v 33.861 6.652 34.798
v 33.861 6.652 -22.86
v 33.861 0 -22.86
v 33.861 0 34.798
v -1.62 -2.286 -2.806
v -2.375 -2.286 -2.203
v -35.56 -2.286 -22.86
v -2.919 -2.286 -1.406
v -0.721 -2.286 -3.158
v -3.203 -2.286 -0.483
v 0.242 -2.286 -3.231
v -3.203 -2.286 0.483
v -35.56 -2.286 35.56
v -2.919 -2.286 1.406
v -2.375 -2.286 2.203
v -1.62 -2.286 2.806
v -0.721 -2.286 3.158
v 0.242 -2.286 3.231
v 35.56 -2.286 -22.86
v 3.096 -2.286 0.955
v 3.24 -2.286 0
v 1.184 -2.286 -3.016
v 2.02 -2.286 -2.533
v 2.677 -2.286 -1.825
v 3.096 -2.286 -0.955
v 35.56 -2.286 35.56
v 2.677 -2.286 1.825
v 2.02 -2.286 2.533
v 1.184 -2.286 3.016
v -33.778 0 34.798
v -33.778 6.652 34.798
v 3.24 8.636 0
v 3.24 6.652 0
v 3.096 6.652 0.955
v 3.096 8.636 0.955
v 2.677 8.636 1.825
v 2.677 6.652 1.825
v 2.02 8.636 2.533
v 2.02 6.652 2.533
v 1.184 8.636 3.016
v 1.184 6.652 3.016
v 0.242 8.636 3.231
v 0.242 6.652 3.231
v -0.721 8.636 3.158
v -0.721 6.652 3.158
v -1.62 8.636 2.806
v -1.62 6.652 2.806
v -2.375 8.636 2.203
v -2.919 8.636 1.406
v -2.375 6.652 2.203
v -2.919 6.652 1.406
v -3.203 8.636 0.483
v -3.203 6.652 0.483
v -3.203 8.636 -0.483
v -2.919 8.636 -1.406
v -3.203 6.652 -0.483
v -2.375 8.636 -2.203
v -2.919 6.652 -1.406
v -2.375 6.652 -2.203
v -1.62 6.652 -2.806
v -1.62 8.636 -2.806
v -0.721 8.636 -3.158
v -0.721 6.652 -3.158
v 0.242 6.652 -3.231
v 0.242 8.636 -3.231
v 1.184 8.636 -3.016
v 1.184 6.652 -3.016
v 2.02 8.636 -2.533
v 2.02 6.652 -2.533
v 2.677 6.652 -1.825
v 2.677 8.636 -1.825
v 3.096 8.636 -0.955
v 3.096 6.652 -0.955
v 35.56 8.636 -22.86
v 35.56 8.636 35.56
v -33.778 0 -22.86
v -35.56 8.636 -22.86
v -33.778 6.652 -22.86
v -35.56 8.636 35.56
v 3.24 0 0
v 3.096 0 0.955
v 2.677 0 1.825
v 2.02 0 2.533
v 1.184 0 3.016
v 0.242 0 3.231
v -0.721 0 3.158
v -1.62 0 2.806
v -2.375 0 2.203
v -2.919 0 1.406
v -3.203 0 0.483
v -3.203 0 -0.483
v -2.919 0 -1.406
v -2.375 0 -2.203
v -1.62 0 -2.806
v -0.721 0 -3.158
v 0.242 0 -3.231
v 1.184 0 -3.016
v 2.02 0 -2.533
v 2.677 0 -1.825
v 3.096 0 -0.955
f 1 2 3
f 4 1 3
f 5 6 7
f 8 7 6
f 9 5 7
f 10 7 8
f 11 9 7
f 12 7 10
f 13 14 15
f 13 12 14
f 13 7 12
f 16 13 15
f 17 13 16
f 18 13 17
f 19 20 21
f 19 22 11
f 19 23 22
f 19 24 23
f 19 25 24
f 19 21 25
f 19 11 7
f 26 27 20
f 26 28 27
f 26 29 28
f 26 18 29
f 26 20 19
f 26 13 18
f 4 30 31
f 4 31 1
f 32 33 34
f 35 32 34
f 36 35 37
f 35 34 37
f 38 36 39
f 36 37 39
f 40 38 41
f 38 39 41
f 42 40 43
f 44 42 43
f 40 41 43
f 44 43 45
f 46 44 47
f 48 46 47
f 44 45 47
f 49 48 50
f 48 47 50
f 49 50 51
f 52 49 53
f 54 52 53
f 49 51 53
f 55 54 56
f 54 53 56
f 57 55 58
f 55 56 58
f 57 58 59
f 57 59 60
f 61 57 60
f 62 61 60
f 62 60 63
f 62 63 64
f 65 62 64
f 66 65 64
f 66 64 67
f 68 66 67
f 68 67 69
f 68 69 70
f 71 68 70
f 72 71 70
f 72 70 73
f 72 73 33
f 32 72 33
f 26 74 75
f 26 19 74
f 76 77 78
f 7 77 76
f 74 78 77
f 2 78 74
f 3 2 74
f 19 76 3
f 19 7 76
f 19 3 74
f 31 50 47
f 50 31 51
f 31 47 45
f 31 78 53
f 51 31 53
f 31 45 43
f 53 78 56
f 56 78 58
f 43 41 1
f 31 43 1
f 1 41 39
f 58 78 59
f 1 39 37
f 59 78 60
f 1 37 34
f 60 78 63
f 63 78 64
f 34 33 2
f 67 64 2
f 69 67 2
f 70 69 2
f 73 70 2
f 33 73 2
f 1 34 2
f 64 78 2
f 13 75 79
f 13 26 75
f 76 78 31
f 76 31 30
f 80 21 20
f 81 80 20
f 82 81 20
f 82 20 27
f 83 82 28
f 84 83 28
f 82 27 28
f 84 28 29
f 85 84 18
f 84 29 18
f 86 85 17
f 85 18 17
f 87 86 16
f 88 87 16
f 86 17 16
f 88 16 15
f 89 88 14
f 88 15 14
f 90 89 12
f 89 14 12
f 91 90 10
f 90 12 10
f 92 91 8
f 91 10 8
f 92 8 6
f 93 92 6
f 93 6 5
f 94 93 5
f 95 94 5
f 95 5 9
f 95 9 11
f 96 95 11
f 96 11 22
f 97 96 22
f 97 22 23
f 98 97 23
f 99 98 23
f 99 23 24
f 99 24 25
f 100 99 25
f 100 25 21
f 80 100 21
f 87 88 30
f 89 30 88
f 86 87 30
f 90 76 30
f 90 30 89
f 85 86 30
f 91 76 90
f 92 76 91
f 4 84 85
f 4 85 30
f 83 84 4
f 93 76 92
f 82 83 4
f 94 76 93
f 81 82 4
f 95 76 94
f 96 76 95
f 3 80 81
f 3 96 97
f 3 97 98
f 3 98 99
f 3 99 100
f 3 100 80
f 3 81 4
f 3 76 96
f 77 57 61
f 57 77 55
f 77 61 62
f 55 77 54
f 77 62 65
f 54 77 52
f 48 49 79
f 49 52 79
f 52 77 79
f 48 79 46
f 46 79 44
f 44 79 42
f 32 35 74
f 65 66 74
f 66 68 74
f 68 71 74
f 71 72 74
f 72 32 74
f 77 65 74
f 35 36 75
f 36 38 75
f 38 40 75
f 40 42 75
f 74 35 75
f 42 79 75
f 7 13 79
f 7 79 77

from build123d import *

# Parameters (mm, degrees)
F1_DEPTH = 2.286
F2_DEPTH = 8.636
F3_W     = 67.638885
F3_H     = 6.652117
F4_DEPTH = 57.658
F5_R     = 3.239595
F6_DEPTH = 25.4


with BuildPart() as f1:
    # F0 (on Front) → F1 (new body)
    with BuildSketch(Plane.XZ):
        Polygon((35.56, 35.56), (0, 35.56), (-35.56, 35.56), (-35.56, -22.86), (35.56, -22.86), align=None)
    extrude(amount=F1_DEPTH)

    # F0 (on Front) → F2 (join)
    with BuildSketch(Plane.XZ):
        Polygon((35.56, 35.56), (0, 35.56), (-35.56, 35.56), (-35.56, -22.86), (35.56, -22.86), align=None)
    extrude(amount=-F2_DEPTH)

    # F3 (on face) → F4 (cut)
    with BuildSketch(Plane(origin=(0, 0, -22.86), x_dir=(1, 0, 0), z_dir=(0, 0, -1))):
        with Locations((0.041259, -3.326058)):
            Rectangle(F3_W, F3_H)
    extrude(amount=-F4_DEPTH, mode=Mode.SUBTRACT)

    # F5 (on face) → F6 (cut)
    with BuildSketch(Plane.XZ.offset(2.286)):
        Circle(F5_R)
    extrude(amount=-F6_DEPTH, mode=Mode.SUBTRACT)


solid = f1.part
